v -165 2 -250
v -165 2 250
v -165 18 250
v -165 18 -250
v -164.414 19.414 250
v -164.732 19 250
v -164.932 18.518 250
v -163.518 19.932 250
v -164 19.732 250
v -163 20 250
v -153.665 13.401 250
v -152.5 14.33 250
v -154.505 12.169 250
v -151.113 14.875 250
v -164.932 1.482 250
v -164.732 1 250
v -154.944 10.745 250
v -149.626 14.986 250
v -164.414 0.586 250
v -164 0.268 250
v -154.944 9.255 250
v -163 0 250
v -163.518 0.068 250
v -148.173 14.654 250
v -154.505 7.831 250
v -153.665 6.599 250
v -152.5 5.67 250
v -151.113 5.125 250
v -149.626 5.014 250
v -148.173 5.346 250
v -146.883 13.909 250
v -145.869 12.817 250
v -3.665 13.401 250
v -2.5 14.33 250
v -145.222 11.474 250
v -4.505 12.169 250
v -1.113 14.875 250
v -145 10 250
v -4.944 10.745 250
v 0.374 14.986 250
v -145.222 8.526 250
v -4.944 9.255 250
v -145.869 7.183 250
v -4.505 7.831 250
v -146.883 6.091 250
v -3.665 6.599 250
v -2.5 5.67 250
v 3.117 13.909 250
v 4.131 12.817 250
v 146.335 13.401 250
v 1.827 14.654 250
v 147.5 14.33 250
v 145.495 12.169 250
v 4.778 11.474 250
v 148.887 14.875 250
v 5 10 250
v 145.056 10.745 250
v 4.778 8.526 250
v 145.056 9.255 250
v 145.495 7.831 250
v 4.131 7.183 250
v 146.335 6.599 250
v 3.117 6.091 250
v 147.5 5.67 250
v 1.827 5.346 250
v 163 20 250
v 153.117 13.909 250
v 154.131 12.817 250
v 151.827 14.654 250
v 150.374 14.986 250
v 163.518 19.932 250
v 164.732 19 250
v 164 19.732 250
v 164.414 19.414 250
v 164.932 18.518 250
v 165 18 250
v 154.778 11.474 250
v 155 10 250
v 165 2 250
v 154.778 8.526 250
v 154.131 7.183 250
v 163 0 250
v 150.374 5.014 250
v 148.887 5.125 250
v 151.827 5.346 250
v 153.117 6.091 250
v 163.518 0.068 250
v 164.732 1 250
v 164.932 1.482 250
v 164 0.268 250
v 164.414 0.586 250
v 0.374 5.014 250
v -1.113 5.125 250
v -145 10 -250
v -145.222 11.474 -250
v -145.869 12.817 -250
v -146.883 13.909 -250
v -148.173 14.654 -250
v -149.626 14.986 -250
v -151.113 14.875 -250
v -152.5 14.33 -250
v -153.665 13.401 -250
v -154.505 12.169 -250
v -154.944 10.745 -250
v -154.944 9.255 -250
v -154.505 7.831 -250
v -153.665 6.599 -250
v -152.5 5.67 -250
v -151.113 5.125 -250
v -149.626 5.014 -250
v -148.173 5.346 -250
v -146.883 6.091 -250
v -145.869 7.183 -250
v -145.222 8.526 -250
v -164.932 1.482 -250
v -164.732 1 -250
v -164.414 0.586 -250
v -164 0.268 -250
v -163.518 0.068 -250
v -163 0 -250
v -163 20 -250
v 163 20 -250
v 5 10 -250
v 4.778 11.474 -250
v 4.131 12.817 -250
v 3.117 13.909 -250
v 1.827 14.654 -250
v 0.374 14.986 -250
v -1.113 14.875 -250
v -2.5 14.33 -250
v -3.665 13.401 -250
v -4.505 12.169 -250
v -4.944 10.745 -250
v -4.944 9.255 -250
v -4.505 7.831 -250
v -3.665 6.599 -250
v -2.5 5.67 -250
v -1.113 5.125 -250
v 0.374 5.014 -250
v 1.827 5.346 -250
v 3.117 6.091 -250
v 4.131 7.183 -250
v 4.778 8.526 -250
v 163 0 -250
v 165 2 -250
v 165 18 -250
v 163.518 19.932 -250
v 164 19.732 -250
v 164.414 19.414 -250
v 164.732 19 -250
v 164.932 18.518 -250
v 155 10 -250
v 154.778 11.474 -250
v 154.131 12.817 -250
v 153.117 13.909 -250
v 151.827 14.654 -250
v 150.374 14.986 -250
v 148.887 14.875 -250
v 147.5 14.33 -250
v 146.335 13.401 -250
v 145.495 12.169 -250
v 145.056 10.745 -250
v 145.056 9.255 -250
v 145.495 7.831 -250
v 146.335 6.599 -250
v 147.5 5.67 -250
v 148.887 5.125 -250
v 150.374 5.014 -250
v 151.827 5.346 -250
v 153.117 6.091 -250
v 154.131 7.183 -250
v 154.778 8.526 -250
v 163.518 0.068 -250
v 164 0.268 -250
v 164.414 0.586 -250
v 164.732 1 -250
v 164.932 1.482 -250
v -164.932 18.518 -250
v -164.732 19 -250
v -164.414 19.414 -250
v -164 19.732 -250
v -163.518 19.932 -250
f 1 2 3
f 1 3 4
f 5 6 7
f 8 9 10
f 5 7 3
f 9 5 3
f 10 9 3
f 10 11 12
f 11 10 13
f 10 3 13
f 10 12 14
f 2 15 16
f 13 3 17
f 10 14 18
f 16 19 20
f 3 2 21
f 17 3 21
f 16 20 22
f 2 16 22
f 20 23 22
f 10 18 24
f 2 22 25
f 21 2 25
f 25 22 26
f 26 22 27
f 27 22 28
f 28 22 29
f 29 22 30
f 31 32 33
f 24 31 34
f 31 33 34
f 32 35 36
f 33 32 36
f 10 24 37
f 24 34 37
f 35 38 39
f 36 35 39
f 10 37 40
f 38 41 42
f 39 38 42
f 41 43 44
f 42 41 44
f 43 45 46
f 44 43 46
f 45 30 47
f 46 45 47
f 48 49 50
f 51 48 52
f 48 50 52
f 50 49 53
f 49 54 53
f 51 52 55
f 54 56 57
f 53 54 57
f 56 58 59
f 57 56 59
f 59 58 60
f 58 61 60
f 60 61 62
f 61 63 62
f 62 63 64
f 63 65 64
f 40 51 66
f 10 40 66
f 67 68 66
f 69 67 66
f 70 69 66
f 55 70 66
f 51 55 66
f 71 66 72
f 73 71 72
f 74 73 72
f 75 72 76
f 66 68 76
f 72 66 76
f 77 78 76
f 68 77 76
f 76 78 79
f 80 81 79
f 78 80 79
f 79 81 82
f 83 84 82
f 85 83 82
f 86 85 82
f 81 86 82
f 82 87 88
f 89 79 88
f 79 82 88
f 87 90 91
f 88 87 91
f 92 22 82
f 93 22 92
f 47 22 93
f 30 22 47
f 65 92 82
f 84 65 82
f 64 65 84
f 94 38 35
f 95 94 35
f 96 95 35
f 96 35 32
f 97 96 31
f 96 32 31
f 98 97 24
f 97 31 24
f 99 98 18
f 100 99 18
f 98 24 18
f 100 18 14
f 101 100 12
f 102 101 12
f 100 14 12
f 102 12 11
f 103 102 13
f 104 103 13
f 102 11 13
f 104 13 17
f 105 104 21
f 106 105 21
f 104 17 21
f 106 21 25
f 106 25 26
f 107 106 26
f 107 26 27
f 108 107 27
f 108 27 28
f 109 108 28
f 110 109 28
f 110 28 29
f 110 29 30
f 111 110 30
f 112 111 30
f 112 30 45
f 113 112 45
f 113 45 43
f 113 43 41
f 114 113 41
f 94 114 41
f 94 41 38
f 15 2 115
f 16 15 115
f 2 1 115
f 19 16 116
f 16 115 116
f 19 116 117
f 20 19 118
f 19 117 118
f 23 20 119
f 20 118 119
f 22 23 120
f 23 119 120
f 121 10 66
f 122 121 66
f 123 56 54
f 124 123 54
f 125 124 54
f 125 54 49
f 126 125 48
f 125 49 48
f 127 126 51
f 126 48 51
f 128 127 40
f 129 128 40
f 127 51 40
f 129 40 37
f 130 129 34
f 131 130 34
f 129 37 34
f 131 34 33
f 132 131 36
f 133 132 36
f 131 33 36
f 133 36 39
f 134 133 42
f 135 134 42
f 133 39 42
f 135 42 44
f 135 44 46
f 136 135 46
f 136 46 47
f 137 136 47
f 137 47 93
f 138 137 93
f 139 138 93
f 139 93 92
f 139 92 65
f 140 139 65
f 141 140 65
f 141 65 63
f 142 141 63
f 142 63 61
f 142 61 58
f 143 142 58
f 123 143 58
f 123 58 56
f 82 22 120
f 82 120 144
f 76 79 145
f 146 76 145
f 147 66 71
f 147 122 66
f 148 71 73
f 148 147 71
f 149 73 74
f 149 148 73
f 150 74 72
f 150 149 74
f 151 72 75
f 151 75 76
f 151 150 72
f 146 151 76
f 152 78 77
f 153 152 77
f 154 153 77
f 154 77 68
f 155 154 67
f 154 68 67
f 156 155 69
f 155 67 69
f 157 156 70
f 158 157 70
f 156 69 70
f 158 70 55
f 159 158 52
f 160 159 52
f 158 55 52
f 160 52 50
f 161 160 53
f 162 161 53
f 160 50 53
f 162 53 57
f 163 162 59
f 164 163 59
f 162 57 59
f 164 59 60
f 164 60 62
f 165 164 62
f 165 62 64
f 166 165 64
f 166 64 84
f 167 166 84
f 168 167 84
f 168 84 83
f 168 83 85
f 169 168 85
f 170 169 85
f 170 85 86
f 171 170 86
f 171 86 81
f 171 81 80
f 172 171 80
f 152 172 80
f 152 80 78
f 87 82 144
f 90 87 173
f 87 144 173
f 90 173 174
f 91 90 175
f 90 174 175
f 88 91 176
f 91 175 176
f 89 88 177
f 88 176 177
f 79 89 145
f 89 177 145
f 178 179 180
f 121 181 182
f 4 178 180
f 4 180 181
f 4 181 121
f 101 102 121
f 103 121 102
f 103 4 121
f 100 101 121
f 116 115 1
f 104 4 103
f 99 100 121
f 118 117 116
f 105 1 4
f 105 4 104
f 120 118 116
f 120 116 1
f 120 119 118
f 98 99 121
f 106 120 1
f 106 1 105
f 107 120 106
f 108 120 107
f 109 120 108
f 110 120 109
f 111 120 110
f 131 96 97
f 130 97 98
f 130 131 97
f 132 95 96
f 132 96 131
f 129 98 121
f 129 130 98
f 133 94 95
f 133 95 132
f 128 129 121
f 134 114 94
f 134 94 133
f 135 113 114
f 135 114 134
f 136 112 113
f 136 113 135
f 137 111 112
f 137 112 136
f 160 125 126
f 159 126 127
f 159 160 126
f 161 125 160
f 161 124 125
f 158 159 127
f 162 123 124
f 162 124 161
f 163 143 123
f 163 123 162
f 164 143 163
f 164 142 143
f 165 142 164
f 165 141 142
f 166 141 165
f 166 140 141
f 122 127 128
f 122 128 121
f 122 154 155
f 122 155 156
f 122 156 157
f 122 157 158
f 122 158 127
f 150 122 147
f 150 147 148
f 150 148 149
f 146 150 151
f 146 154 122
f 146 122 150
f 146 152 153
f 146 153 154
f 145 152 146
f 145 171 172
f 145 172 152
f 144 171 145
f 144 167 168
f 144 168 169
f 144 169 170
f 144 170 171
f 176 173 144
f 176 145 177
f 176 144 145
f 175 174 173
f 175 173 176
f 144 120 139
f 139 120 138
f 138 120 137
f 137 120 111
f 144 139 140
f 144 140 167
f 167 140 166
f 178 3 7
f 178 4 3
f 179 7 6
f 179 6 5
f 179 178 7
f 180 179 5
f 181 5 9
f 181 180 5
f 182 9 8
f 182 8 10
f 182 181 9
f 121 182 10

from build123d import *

# Parameters (mm, degrees)
SKETCH1_W           = 330
SKETCH1_H           = 500
BOSS_EXTRUDE1_DEPTH = 20
SKETCH2_R           = 5
CUT_EXTRUDE1_DEPTH  = 527.901319034
FILLET1_R           = 2


with BuildPart() as part:
    # Sketch1 → Boss-Extrude1 (new body)
    with BuildSketch(Plane(origin=(0, 0, 0), x_dir=(1, 0, 0), z_dir=(0, 1, 0))):
        Rectangle(SKETCH1_W, SKETCH1_H)
    extrude(amount=BOSS_EXTRUDE1_DEPTH)

    # Sketch2 → Cut-Extrude1 (cut, through all)
    with BuildSketch(Plane.XY.offset(250)):
        with Locations((0, 10)):
            Circle(SKETCH2_R)
        with Locations((-150, 10)):
            Circle(SKETCH2_R)
        with Locations((150, 10)):
            Circle(SKETCH2_R)
    extrude(amount=-CUT_EXTRUDE1_DEPTH, mode=Mode.SUBTRACT)

    # Fillet1
    fillet1_edges = [part.edges().sort_by_distance(p)[0] for p in [
        (-165, 20, 0),
        (165, 20, 0),
        (-165, 0, 0),
        (165, 0, 0),
    ]]
    fillet(fillet1_edges, radius=FILLET1_R)


solid = part.part
